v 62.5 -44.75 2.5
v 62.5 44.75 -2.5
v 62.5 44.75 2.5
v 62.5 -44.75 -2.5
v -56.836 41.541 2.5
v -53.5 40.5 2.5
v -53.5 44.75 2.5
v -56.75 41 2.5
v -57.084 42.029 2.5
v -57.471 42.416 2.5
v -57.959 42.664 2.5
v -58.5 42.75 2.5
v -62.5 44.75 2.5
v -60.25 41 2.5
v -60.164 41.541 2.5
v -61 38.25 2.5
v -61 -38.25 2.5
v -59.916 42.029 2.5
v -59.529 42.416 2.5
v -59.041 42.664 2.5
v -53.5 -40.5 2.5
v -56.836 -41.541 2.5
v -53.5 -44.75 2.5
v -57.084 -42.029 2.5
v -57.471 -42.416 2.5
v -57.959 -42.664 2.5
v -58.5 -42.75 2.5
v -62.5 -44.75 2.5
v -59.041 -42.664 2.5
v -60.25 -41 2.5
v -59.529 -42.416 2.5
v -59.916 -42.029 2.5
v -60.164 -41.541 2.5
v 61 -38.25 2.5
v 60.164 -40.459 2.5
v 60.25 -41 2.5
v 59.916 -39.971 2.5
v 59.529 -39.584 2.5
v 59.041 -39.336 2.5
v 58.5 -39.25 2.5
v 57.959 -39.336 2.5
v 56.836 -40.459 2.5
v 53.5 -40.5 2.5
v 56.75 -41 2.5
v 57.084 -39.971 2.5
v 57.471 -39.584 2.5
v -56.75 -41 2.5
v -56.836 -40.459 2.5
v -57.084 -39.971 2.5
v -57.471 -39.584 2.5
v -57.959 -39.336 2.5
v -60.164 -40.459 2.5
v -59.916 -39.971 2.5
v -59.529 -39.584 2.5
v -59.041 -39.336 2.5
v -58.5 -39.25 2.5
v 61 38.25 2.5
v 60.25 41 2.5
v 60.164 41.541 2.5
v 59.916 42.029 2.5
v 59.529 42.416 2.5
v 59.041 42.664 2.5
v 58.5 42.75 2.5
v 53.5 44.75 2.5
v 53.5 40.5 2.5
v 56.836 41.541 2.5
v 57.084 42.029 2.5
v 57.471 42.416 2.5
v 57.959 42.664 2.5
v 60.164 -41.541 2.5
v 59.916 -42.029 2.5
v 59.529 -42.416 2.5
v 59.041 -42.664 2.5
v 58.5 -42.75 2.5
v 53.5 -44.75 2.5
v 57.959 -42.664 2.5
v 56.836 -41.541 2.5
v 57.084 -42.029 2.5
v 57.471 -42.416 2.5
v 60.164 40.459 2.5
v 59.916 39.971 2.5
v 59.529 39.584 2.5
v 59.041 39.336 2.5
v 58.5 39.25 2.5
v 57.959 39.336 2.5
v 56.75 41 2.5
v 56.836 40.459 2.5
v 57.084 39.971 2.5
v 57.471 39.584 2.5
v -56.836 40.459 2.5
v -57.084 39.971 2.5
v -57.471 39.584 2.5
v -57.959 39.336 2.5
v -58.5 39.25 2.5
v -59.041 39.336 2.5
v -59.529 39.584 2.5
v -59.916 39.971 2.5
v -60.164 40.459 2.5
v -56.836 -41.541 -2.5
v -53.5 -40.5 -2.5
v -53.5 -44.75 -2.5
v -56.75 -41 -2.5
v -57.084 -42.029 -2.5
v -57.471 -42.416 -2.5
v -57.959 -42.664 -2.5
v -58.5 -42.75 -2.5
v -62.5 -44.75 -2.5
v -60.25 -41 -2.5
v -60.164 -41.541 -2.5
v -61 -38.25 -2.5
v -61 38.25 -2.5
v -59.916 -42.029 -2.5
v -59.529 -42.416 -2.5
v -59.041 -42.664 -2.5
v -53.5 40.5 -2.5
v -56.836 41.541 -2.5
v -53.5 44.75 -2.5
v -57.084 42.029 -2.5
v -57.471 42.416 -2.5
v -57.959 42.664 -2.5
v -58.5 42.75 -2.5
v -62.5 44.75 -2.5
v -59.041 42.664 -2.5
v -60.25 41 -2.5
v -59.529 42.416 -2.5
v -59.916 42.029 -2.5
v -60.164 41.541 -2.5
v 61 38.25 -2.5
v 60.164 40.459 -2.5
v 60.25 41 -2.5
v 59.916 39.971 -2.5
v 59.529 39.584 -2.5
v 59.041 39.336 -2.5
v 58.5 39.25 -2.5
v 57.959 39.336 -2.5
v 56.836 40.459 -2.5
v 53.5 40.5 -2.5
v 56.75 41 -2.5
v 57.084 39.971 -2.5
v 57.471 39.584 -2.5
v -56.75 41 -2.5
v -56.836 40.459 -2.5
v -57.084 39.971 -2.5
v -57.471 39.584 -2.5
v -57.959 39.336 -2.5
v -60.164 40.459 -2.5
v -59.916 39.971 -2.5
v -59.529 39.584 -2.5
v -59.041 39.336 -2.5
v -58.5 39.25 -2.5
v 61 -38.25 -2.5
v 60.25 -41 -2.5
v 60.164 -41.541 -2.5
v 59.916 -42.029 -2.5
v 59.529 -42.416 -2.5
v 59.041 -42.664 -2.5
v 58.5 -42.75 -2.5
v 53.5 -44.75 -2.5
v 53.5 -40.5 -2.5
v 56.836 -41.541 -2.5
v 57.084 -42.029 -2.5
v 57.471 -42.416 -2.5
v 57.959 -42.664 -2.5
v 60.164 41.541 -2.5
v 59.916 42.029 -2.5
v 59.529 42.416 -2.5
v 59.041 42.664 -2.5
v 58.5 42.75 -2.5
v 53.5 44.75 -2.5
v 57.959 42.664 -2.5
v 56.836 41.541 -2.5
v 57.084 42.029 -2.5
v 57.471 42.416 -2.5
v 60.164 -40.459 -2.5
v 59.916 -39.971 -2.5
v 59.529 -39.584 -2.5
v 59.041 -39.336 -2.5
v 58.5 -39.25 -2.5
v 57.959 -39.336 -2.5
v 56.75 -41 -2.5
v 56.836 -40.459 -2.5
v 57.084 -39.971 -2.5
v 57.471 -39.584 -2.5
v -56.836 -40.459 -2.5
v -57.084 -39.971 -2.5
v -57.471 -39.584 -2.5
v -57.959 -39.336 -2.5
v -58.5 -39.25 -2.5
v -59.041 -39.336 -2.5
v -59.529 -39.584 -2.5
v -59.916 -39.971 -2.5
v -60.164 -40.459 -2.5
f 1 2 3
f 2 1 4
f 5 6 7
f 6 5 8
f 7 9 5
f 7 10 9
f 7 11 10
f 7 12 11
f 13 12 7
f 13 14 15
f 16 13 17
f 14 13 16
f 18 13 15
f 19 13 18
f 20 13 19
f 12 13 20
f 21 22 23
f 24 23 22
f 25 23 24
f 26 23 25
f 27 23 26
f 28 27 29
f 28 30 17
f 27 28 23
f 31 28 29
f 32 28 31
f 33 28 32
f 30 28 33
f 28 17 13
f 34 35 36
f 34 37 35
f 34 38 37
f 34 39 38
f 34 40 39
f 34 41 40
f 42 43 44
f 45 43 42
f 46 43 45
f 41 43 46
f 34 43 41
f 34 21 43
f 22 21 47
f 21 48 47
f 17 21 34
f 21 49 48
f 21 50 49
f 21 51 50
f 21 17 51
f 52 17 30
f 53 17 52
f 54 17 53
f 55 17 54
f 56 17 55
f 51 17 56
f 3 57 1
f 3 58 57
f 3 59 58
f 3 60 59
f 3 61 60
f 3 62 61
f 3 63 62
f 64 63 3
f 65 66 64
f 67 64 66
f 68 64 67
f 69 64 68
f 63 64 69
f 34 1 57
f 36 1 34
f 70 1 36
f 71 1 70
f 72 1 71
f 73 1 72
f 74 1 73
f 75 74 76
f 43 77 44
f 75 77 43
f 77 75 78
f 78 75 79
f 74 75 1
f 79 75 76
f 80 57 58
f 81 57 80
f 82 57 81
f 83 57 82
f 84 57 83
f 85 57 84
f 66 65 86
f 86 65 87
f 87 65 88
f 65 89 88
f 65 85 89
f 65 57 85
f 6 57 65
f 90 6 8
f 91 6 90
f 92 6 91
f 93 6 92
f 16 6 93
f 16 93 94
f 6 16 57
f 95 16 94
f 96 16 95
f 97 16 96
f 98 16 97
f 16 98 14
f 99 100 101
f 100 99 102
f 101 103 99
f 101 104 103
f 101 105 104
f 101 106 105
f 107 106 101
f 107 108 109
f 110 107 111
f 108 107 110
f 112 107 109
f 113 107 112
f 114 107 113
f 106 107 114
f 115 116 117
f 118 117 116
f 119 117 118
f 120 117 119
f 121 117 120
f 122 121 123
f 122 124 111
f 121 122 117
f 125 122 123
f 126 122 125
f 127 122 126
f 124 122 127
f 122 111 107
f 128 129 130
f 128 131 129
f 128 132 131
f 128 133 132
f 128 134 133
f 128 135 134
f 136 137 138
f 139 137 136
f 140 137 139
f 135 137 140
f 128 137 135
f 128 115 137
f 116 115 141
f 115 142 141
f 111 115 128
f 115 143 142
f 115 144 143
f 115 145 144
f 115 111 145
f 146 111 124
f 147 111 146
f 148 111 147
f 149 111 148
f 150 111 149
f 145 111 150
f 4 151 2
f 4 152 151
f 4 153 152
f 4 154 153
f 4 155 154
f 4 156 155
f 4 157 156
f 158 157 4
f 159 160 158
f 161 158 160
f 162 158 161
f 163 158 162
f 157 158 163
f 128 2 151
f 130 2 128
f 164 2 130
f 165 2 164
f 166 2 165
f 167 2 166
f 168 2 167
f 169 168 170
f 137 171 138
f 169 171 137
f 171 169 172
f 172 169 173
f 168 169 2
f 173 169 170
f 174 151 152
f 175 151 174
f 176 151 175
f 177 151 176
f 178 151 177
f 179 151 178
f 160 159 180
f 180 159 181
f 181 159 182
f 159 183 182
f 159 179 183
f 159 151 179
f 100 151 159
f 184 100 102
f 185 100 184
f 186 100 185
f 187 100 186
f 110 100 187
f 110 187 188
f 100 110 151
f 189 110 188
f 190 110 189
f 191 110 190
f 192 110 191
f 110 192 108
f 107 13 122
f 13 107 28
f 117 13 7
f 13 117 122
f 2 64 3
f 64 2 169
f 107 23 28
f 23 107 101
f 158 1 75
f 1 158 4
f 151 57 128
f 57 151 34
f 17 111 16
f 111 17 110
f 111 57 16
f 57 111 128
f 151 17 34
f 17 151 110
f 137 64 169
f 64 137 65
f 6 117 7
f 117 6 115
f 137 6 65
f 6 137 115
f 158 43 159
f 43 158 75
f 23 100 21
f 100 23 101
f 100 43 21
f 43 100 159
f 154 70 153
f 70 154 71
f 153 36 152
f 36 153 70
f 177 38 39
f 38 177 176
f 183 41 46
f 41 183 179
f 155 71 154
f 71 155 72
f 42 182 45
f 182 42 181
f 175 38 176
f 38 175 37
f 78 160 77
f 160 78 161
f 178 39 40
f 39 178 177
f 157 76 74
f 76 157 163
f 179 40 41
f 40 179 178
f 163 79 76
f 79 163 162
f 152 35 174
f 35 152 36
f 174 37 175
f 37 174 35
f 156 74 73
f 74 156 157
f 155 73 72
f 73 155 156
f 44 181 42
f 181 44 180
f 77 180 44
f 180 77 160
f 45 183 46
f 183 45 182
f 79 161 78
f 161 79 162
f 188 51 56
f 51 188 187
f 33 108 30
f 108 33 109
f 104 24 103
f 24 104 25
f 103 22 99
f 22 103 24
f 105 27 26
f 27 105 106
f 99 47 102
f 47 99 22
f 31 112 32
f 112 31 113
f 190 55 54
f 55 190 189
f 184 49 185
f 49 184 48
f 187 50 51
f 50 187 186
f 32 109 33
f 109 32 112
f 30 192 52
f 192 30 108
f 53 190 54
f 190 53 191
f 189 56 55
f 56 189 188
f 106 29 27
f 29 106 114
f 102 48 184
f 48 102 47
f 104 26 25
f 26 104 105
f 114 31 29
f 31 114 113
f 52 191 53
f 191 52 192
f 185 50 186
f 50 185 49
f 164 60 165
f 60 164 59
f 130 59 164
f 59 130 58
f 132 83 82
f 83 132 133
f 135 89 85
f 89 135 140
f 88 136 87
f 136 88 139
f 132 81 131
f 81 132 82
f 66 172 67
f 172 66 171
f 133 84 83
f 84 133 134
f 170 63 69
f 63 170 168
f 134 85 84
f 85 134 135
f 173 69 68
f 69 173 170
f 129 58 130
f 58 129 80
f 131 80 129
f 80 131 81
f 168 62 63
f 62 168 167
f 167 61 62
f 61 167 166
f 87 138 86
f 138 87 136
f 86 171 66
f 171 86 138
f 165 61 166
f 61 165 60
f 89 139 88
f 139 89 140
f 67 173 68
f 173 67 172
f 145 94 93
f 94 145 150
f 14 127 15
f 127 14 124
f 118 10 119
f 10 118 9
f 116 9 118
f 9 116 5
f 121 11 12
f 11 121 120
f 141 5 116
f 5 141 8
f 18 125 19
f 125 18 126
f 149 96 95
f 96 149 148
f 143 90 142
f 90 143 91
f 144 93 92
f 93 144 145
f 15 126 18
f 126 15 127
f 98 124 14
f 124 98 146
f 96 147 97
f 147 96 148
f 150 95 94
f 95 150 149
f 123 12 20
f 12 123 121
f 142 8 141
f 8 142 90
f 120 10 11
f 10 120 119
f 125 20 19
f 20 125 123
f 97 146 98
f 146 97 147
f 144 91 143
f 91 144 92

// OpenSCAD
outer_width = 125;
outer_height = 89.5;
depth = 5;
mount_hole_diameter = 3.5;

inner_width = 122;
inner_height = 76.5;

inset_width = 107;
inset_height = 5;

module mount_hole() {
  translate([(outer_width/2)-4,41,0])
    cylinder(d=mount_hole_diameter, h=depth, center=true, $fn=20);
}

difference() {
  difference() {
    difference() {
      cube([outer_width, outer_height, depth], center=true);
      cube([inner_width, inner_height, depth], center=true);
    }
    translate([0,43,0]) cube([inset_width, inset_height, depth], center=true);
    mirror([0,1,0]) {
      translate([0,43,0]) cube([inset_width, inset_height, depth], center=true);
    }
  }
  mirror([0,0,0]) mount_hole();
  mirror([1,0,0]) mount_hole();
  mirror([0,1,0]) {
    mirror([0,0,0]) mount_hole();
    mirror([1,0,0]) mount_hole();
  }
  
}
